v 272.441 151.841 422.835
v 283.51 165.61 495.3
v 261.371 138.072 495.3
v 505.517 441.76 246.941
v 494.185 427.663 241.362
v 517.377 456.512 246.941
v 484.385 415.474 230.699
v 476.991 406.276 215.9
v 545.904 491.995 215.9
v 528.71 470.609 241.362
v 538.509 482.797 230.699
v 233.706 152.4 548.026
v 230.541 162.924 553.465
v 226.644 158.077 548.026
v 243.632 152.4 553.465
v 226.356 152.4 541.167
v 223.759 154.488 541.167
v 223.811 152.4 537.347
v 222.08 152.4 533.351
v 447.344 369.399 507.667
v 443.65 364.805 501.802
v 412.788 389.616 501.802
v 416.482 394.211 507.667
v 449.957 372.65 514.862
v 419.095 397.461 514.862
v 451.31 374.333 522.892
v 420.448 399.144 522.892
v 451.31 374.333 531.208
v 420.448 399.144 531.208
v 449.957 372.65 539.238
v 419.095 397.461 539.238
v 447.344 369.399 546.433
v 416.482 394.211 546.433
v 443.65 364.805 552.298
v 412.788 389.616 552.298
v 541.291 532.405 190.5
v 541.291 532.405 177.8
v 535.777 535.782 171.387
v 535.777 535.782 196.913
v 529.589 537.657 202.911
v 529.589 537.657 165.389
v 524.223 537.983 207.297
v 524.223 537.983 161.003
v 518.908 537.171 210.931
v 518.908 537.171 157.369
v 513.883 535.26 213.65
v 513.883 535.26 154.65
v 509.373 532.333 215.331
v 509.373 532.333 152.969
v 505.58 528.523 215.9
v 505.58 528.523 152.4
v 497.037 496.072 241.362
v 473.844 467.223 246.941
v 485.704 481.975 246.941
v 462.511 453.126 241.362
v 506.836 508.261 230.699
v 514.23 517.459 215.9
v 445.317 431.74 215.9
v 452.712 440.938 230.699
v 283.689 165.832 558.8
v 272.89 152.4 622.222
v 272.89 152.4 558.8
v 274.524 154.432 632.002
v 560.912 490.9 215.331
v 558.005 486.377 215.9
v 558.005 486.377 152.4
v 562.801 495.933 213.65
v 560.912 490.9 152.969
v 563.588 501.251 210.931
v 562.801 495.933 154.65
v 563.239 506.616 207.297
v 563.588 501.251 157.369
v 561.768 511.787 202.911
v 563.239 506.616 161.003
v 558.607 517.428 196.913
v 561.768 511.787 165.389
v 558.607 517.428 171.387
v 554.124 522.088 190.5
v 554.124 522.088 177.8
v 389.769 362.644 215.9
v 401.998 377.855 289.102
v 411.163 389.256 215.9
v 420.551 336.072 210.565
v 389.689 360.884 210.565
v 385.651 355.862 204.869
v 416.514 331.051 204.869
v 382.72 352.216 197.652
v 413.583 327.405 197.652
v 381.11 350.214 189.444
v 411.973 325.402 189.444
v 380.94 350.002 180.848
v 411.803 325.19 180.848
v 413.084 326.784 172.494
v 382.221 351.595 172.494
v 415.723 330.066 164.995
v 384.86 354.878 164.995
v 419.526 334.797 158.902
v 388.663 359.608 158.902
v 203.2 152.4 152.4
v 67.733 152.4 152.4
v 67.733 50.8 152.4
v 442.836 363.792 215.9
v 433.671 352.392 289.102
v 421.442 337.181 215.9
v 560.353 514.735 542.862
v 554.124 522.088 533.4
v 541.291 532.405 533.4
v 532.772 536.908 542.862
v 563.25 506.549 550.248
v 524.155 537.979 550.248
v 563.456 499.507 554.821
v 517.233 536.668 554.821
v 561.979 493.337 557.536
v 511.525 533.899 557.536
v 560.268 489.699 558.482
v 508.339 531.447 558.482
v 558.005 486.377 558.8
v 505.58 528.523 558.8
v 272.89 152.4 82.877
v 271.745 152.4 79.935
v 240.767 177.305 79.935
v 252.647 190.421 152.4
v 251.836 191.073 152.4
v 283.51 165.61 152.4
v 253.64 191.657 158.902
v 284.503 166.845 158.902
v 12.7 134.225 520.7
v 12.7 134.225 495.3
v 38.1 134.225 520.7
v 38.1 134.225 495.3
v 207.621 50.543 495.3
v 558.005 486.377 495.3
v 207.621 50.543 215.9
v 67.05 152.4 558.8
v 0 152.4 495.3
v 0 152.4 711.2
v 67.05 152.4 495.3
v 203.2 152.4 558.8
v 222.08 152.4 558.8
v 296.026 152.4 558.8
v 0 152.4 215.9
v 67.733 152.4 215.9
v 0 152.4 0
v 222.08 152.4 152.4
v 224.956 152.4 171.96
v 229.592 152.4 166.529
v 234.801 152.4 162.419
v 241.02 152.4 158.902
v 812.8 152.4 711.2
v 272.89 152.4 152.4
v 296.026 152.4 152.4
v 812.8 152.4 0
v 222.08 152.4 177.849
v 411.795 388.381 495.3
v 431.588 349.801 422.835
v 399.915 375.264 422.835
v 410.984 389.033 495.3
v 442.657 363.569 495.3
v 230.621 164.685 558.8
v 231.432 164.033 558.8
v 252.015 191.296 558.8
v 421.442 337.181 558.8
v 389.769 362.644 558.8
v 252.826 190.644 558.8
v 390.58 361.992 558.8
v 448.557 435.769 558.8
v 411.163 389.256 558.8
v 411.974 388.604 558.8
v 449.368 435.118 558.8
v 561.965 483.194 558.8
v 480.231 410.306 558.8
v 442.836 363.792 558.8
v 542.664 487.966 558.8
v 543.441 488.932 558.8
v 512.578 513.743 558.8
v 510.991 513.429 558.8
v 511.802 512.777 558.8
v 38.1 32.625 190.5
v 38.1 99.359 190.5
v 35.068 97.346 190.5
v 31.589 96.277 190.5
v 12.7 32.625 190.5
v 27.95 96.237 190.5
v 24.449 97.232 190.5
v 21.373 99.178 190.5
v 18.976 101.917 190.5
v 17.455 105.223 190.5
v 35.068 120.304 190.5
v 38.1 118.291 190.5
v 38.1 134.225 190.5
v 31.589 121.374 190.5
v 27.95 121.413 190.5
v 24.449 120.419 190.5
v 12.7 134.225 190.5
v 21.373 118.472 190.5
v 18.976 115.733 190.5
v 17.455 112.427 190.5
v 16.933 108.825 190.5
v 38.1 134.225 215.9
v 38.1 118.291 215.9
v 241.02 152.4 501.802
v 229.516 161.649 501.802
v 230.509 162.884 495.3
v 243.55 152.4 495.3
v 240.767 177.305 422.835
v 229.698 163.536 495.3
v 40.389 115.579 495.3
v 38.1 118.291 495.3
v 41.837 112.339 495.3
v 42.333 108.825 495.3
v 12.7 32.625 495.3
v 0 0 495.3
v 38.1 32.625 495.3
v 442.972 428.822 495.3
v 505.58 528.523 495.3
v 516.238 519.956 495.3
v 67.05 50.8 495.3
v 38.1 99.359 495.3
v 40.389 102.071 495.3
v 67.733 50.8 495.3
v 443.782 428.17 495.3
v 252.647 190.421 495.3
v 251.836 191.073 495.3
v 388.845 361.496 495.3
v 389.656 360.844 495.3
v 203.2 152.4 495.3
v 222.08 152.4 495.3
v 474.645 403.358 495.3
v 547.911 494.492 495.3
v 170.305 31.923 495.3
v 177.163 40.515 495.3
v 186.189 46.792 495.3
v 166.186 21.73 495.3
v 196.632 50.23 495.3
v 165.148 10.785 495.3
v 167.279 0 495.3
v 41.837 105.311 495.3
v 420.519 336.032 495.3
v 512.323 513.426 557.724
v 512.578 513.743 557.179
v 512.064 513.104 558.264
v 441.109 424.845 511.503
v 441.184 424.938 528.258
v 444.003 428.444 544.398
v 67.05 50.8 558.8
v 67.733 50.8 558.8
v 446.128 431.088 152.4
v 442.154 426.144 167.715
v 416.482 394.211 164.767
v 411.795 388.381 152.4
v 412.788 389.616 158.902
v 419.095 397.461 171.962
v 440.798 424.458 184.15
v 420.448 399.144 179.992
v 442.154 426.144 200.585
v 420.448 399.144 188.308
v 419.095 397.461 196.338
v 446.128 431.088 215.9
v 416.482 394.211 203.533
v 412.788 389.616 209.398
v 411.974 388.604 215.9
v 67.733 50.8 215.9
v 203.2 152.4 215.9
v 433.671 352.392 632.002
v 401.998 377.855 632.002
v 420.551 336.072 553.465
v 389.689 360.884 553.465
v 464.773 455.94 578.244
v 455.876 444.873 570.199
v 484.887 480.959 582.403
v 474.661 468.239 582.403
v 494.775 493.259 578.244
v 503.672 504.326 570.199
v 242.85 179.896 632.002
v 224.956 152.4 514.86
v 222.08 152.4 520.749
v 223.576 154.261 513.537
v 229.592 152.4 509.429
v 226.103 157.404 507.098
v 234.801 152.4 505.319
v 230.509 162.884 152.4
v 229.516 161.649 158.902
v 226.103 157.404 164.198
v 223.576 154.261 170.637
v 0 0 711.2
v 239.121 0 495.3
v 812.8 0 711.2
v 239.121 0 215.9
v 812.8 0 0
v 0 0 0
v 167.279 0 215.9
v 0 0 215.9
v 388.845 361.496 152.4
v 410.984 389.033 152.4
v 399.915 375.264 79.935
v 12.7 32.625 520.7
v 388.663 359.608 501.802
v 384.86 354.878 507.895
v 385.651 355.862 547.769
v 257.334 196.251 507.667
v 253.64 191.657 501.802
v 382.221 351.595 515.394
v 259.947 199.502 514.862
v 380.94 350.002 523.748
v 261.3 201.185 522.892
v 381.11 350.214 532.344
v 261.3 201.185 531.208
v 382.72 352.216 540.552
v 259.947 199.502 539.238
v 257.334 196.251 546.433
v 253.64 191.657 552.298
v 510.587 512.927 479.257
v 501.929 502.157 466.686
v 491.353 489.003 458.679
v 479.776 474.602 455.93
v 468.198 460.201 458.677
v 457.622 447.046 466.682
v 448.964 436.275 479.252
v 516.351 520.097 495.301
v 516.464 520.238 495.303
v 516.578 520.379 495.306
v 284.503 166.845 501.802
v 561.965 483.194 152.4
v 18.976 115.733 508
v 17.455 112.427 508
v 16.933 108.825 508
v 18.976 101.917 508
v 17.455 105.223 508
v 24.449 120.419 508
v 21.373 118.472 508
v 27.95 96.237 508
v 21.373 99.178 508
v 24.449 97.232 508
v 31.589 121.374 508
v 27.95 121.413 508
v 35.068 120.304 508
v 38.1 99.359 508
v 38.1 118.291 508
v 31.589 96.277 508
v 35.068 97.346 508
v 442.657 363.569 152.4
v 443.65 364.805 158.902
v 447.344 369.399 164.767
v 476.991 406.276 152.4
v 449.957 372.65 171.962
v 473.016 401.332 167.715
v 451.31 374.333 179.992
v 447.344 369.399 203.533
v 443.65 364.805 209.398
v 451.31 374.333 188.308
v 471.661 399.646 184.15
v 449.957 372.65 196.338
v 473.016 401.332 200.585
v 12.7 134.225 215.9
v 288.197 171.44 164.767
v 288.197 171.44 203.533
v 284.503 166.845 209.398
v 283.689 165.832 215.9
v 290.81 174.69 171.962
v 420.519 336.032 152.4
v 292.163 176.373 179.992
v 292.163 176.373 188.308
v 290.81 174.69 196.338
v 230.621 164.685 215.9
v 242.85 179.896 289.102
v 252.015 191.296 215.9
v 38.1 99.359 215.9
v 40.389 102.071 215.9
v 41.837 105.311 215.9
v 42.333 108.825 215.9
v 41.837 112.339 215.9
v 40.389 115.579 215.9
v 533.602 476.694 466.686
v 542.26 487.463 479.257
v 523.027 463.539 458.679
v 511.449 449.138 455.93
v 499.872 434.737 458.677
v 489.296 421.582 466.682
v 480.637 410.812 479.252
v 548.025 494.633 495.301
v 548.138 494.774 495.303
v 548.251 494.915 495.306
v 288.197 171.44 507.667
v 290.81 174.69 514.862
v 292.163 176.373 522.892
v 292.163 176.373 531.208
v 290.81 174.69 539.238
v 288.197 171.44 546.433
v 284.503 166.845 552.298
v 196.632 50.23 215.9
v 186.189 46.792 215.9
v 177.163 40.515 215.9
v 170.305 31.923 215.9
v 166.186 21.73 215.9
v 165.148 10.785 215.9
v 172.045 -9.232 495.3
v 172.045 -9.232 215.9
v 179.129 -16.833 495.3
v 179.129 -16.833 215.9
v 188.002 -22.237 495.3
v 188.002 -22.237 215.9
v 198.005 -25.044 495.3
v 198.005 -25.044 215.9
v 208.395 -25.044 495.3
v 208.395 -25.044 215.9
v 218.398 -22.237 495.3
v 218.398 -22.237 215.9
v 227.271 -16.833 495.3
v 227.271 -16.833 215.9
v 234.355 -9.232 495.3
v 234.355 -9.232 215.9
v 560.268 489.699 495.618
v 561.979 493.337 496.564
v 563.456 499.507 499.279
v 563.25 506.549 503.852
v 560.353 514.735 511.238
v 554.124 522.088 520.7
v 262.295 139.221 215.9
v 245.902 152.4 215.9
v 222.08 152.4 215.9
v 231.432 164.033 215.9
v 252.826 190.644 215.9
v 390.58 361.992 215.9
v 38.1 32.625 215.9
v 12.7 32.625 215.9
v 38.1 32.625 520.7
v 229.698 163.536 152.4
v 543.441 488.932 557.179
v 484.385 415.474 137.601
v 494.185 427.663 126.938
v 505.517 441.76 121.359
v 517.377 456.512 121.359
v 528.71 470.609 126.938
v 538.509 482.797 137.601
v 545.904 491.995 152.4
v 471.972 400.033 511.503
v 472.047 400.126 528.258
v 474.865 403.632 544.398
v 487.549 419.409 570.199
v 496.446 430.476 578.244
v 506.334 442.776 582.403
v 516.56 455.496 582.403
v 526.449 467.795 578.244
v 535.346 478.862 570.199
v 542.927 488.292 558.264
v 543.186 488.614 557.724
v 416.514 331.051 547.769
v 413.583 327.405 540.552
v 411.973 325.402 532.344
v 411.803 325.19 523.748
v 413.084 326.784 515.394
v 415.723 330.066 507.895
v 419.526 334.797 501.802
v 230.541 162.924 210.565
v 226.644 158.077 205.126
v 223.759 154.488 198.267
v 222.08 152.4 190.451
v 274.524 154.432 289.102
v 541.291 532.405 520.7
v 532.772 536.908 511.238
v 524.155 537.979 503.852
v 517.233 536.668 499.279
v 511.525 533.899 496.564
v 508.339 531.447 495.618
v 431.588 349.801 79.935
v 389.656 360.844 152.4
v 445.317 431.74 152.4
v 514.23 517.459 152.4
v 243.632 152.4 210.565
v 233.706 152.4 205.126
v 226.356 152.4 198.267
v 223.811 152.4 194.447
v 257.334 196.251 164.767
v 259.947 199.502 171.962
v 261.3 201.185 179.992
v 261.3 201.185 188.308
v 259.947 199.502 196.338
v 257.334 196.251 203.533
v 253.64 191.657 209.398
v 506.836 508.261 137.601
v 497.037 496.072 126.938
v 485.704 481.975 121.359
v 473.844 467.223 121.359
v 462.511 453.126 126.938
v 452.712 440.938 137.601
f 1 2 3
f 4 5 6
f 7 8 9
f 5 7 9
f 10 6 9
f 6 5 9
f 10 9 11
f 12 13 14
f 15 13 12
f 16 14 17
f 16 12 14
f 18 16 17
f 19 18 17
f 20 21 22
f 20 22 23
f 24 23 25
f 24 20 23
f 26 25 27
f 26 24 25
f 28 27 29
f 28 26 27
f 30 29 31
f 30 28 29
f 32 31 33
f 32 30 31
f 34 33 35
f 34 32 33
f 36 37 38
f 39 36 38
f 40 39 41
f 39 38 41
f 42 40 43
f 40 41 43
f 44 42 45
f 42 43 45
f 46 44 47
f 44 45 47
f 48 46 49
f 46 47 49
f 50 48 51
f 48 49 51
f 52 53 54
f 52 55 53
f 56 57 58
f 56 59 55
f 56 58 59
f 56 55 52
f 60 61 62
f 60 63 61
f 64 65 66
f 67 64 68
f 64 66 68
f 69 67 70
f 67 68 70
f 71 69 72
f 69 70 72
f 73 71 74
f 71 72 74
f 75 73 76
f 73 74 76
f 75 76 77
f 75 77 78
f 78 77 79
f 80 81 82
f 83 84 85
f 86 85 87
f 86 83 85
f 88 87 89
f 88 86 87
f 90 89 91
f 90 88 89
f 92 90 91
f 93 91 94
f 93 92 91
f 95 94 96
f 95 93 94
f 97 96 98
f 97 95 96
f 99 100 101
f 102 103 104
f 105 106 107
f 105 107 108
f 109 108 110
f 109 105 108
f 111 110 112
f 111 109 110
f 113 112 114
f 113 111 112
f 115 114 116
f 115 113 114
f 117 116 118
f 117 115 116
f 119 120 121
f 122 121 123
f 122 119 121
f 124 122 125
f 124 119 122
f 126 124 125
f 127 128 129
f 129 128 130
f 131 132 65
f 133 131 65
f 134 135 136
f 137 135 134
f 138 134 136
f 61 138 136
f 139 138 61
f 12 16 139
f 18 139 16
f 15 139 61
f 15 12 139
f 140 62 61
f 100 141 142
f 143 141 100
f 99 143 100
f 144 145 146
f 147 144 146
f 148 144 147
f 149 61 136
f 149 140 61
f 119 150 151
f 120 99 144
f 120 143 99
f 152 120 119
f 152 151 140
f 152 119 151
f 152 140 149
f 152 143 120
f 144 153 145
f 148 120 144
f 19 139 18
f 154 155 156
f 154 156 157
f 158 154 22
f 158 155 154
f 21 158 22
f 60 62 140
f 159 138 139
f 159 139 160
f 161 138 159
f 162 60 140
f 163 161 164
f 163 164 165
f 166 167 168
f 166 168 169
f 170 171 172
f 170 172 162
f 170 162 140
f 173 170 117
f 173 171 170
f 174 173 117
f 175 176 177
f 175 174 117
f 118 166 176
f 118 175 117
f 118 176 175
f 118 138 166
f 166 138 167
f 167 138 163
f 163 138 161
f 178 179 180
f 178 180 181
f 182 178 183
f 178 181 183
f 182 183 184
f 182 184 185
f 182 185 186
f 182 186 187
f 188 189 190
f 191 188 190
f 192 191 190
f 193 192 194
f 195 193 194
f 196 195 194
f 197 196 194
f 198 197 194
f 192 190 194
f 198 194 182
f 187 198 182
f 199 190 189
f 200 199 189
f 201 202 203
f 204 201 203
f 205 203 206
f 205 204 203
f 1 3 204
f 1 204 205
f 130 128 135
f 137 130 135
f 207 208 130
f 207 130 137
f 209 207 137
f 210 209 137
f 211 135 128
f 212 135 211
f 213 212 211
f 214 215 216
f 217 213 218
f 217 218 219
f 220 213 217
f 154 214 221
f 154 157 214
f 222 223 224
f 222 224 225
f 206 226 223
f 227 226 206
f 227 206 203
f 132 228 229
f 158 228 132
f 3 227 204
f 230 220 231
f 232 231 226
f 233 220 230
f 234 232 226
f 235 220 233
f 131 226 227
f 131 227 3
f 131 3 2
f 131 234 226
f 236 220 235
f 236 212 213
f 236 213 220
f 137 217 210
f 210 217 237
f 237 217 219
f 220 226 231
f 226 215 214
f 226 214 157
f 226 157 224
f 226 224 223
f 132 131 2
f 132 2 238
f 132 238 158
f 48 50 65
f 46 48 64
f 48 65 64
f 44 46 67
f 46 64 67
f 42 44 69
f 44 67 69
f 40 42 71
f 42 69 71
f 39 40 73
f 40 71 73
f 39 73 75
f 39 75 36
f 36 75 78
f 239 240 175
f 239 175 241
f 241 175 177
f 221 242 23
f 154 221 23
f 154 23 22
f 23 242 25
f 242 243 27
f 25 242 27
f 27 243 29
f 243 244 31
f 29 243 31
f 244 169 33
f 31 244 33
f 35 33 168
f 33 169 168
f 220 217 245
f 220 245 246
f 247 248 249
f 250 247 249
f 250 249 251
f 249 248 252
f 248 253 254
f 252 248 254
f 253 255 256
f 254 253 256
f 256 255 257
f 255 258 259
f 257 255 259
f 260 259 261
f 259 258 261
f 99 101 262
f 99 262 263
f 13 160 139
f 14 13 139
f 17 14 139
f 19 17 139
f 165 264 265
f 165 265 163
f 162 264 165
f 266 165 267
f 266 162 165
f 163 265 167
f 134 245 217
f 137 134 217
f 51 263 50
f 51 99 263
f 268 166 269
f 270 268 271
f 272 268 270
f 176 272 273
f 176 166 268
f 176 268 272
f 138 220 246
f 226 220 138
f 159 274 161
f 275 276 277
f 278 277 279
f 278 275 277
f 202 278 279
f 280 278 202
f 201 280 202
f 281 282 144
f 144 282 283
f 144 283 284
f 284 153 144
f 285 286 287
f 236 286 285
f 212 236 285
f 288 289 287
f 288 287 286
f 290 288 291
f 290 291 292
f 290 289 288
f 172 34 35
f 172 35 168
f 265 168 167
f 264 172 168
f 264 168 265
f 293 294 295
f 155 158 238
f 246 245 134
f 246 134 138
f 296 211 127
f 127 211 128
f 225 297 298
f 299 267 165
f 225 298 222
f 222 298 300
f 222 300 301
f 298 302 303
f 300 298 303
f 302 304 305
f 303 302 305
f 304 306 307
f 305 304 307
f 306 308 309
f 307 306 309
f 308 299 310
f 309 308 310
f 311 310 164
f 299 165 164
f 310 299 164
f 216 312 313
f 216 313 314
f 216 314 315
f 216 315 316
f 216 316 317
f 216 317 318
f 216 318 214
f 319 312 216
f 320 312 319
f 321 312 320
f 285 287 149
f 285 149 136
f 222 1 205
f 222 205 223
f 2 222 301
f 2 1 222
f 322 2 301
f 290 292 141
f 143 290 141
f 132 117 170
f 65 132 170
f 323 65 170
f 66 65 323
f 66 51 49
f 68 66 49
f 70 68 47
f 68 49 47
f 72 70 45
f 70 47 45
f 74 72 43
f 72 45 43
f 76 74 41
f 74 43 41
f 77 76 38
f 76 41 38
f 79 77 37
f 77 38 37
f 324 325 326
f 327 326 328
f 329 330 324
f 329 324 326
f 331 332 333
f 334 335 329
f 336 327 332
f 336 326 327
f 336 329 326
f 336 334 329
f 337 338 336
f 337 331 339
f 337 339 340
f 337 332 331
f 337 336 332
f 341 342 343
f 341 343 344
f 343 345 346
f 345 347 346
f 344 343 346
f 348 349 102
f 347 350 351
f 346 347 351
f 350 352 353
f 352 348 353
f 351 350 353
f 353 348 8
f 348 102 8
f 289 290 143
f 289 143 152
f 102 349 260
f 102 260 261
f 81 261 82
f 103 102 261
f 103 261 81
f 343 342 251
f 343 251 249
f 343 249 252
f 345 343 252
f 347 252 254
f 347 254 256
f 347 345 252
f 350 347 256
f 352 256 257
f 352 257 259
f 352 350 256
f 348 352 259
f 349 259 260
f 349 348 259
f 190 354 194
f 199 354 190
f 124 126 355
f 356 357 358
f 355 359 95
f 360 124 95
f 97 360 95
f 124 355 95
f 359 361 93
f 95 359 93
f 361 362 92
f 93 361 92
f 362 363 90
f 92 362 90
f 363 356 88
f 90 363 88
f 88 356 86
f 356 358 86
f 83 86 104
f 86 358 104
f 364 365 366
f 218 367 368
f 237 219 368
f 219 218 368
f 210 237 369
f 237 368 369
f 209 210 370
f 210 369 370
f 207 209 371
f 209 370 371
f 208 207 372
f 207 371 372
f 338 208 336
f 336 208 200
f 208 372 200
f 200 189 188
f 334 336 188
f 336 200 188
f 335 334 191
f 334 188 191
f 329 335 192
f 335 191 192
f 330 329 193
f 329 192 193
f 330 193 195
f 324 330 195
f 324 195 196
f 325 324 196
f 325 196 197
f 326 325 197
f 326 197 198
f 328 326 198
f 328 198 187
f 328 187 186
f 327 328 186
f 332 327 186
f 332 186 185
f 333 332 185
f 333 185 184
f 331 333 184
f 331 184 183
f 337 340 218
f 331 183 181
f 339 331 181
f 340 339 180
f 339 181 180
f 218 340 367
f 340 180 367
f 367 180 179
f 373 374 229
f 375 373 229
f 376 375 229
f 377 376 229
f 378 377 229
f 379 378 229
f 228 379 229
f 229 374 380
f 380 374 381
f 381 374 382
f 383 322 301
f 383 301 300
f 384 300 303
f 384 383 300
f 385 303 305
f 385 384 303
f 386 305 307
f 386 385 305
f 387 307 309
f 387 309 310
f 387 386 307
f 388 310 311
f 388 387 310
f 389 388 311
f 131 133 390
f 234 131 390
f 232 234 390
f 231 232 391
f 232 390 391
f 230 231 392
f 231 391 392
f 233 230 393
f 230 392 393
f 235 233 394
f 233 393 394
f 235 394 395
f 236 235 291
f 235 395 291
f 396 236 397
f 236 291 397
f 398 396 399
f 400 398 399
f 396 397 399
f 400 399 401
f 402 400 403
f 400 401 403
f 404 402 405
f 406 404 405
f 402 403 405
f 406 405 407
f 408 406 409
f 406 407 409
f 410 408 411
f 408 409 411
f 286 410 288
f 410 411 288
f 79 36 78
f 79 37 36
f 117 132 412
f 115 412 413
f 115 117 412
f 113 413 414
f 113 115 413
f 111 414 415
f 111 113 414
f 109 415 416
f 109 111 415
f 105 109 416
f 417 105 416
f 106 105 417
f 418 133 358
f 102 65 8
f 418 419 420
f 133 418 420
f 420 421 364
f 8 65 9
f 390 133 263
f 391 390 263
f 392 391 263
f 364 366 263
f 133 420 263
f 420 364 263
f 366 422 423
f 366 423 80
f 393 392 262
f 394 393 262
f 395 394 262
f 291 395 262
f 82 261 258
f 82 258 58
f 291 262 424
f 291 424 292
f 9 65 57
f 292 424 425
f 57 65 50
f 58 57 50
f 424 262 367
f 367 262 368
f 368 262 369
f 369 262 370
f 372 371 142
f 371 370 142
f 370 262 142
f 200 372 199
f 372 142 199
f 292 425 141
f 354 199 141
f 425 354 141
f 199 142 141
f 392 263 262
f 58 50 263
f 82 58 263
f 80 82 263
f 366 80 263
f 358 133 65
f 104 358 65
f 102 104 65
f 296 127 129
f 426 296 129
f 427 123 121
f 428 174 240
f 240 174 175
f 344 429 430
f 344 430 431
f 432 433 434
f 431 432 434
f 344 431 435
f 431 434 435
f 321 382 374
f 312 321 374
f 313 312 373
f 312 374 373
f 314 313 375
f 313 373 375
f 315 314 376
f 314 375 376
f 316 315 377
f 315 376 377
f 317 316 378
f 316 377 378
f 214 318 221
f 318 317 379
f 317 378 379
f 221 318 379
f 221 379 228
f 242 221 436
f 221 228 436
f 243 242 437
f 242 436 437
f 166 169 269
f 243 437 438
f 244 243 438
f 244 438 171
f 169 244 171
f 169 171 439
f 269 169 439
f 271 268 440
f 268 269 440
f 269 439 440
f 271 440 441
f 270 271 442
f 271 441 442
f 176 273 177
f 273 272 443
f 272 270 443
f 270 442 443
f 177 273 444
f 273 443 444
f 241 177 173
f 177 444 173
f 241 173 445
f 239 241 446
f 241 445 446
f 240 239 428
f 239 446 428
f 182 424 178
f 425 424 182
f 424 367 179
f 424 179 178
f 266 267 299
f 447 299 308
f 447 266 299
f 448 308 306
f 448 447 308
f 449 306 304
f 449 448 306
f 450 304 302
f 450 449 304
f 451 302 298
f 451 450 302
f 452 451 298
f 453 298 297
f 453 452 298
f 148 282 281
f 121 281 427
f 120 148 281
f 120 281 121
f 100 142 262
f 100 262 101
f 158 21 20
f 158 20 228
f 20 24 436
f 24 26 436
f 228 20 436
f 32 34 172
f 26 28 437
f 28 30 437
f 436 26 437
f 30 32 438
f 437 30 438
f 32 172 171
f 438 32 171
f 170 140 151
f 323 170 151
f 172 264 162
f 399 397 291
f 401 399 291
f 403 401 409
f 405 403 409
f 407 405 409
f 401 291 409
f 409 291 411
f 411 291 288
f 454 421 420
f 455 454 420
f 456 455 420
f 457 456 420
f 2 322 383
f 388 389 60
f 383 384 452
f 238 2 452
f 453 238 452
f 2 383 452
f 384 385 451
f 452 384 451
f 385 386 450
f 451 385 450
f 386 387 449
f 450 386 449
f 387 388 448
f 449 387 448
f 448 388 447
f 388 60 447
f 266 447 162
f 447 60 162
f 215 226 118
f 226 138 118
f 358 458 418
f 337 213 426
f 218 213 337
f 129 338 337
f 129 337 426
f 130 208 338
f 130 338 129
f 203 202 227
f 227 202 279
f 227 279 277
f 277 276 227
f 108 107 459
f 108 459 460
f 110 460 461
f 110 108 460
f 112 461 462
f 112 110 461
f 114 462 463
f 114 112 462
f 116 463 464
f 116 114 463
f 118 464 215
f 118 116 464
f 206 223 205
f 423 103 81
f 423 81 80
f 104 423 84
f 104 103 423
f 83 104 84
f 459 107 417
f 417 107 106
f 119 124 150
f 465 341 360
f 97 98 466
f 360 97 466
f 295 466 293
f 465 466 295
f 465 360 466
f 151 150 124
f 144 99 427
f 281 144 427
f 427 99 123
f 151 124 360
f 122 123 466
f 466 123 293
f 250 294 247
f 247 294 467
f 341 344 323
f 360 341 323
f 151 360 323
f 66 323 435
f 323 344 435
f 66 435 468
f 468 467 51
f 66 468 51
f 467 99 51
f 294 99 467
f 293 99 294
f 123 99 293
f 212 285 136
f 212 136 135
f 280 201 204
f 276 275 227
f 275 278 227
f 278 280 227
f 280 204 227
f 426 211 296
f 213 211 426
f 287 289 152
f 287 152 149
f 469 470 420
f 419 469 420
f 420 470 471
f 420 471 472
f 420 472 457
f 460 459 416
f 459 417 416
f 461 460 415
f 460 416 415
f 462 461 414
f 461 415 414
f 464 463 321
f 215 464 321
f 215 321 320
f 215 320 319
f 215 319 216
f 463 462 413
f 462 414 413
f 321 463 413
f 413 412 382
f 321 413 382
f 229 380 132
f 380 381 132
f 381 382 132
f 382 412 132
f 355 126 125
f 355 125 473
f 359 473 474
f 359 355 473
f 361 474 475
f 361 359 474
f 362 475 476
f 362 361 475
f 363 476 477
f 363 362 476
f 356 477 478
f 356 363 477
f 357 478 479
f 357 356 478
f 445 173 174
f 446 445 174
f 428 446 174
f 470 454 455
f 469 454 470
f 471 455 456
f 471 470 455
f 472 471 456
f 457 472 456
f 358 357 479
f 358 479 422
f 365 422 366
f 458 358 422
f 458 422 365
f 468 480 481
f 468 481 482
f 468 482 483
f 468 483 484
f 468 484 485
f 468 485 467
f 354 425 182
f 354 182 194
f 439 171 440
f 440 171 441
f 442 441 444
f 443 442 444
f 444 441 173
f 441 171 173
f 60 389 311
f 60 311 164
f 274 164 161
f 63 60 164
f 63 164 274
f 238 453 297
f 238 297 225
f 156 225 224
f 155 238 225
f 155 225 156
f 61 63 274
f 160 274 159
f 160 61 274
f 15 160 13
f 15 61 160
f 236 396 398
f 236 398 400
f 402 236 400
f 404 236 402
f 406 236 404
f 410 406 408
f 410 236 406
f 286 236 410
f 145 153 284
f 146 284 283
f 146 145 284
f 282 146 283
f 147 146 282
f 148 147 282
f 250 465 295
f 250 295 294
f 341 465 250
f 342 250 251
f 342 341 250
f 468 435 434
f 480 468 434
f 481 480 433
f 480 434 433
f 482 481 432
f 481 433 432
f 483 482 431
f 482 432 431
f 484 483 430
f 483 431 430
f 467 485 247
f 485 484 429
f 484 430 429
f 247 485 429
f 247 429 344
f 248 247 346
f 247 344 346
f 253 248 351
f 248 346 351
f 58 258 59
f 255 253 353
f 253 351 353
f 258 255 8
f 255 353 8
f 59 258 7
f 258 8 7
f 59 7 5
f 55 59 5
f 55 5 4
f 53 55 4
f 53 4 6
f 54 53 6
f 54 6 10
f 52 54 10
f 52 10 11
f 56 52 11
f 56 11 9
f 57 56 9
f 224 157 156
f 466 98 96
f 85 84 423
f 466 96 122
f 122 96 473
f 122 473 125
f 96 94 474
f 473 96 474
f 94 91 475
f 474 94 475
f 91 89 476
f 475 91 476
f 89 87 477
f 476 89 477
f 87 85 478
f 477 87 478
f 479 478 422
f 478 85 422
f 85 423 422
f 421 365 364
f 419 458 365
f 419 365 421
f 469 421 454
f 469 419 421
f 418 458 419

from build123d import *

# Parameters (mm, degrees)
BOSS_EXTRUDE1_DEPTH  = 152.4
CUT_EXTRUDE1_DEPTH   = 406.4
BOSS_EXTRUDE2_DEPTH  = 406.4
CUT_EXTRUDE3_DEPTH   = 508
BOSS_EXTRUDE3_DEPTH  = 25.4
BOSS_EXTRUDE4_DEPTH  = 25.4
BOSS_EXTRUDE5_DEPTH  = 12.7
BOSS_EXTRUDE6_DEPTH  = 12.7
CUT_EXTRUDE4_START   = -406.4
CUT_EXTRUDE4_DEPTH   = 406.4
FILLET1_R            = 25.4
SKETCH16_W           = 406.4
SKETCH16_H           = 431.79999999999995
BOSS_EXTRUDE8_DEPTH  = 5.08
CUT_EXTRUDE5_DEPTH   = 508
SKETCH20_W           = 25.39999999999924
SKETCH20_H           = 279.40000000000003
CUT_EXTRUDE6_DEPTH   = 508
BOSS_EXTRUDE9_DEPTH  = 40.64
SKETCH22_R           = 63.50000000000003
SKETCH22_R_2         = 63.49999999999997
BOSS_EXTRUDE10_DEPTH = 40.64
SKETCH23_R           = 38.1
CUT_EXTRUDE7_DEPTH   = 279.4
SKETCH24_W           = 279.4
SKETCH24_H           = 50.542616051246114
CUT_EXTRUDE8_DEPTH   = 182.88000000000048
SKETCH25_R           = 38.1
BOSS_EXTRUDE11_DEPTH = 279.4
BOSS_EXTRUDE12_DEPTH = 63.50000000000077
BOSS_EXTRUDE14_DEPTH = 63.50000000000077
SKETCH32_W           = 67.04968691962685
SKETCH32_H           = 63.49999999999994
SKETCH32_W_2         = 67.73333333333292
SKETCH32_H_2         = 63.49999999999997
BOSS_EXTRUDE15_DEPTH = 101.6
CUT_EXTRUDE9_DEPTH   = 25.4
SKETCH34_W           = 25.40000000000001
SKETCH34_H           = 101.6
CUT_EXTRUDE11_DEPTH  = 304.8
SKETCH36_R           = 12.7
BOSS_EXTRUDE16_DEPTH = 317.5


with BuildPart() as part:
    # Sketch1 → Boss-Extrude1 (new body)
    with BuildSketch(Plane(origin=(0, 0, 0), x_dir=(1, 0, 0), z_dir=(0, 1, 0))):
        Polygon((0, 0), (812.8, 0), (812.8000000000001, -711.1999999999999), (0, -711.1999999999999), align=None)
    extrude(amount=BOSS_EXTRUDE1_DEPTH)

    # Sketch2 → Cut-Extrude1 (cut)
    with BuildSketch(Plane(origin=(0, 0, 152.4), x_dir=(-1, 0, 0), z_dir=(0, 0, -1))):
        Polygon((0, 0), (-203.2, 152.4), (0, 152.4), align=None)
    extrude(amount=-CUT_EXTRUDE1_DEPTH, mode=Mode.SUBTRACT)

    # Sketch5 → Boss-Extrude2 (add)
    with BuildSketch(Plane.XY.offset(558.8)):
        Polygon((203.2, 152.4), (521.495119519974, 548.3194575791465), (554.1241709988542, 522.0876883607381), (256.91779556245336, 152.39999999999998), align=None)
    extrude(amount=-BOSS_EXTRUDE2_DEPTH)

    # Sketch6 → Cut-Extrude3 (cut)
    with BuildSketch(Plane(origin=(472.48898283734724, 587.7174054041558, 0), x_dir=(0.7793690109825708, -0.6265651959054618, 0), z_dir=(0.6265651959054618, 0.7793690109825708, 0))):
        Polygon((62.87924717566551, -203.2), (104.74523237533951, -203.2), (104.74523237533951, -508), (62.87924717566555, -508), align=None)
    extrude(amount=-CUT_EXTRUDE3_DEPTH, mode=Mode.SUBTRACT)

    # Sketch8 → Boss-Extrude3 (add)
    with BuildSketch(Plane(origin=(81.63518816150813, -65.62971704341768, 0), x_dir=(0, 0, -1), z_dir=(0.7793690109825717, -0.6265651959054606, 0))):
        Polygon((-558.8, 754.0938850817336), (-508, 754.0938850817336), (-508, 246.0938850817336), (-558.7999999999998, 246.0938850817336), align=None)
    extrude(amount=BOSS_EXTRUDE3_DEPTH)

    # Sketch9 → Boss-Extrude4 (add)
    with BuildSketch(Plane(origin=(81.63518816150813, -65.62971704341768, 0), x_dir=(0, 0, -1), z_dir=(0.7793690109825717, -0.6265651959054606, 0))):
        Polygon((-203.2, 754.0938850817341), (-152.39999999999998, 754.0938850817341), (-152.39999999999998, 246.09388508173413), (-203.19999999999993, 246.09388508173413), align=None)
    extrude(amount=BOSS_EXTRUDE4_DEPTH)

    # Sketch10 → Boss-Extrude5 (add)
    with BuildSketch(Plane.XY.offset(203.2)):
        Polygon((203.1999999999997, 152.40000000000092), (521.4951195199743, 548.319457579147), (573.920143877812, 506.1729323847398), (289.50826251979043, 152.39999999999992), (256.9177955624533, 152.39999999999986), (235.82905147888056, 126.16823078159206), align=None)
    extrude(amount=BOSS_EXTRUDE5_DEPTH)

    # Sketch11 → Boss-Extrude6 (add)
    with BuildSketch(Plane(origin=(0, 0, 508), x_dir=(-1, 0, 0), z_dir=(0, 0, -1))):
        Polygon((-573.9201438778116, 506.1729323847395), (-289.5082625197906, 152.40000000000015), (-256.91779556245325, 152.39999999999995), (-235.82905147888056, 126.16823078159206), (-203.1999999999997, 152.40000000000092), (-521.4951195199743, 548.319457579147), align=None)
    extrude(amount=BOSS_EXTRUDE6_DEPTH)

    # Sketch12 → Cut-Extrude4 (cut)
    with BuildSketch(Plane(origin=(0, 0, 152.39999999999975), x_dir=(-1, 0, 0), z_dir=(0, 0, -1)).offset(CUT_EXTRUDE4_START)):
        Polygon((-272.8899527583018, 152.4), (-543.4408043502763, 488.93153894227703), (-512.5781156253607, 513.7432601354462), (-222.08015203498906, 152.39999999999998), align=None)
    extrude(amount=CUT_EXTRUDE4_DEPTH, mode=Mode.SUBTRACT)

    # Fillet1
    fillet1_edges = [part.edges().sort_by_distance(p)[0] for p in [
        (547.7076316988932, 527.2461949819434, 215.89999999999998),
        (547.707631698893, 527.2461949819433, 495.3),
        (547.707631698893, 527.2461949819432, 152.39999999999998),
        (521.4951195199742, 548.3194575791467, 184.14999999999998),
        (547.7076316988928, 527.246194981943, 558.8),
        (521.4951195199742, 548.3194575791467, 527.05),
        (573.9201438778116, 506.17293238473945, 527.05),
        (573.920143877812, 506.17293238473985, 184.14999999999998),
    ]]
    fillet(fillet1_edges, radius=FILLET1_R)

    # Sketch16 → Boss-Extrude8 (add)
    with BuildSketch(Plane(origin=(101.43116104046555, -81.54447301941644, 0), x_dir=(0, 0, -1), z_dir=(0.7793690109825715, -0.6265651959054606, 0))):
        with Locations((-355.59999999999997, 512.7938850817336)):
            Rectangle(SKETCH16_W, SKETCH16_H)
    extrude(amount=BOSS_EXTRUDE8_DEPTH)

    # Sketch18 → Cut-Extrude5 (cut)
    with BuildSketch(Plane(origin=(154.19386331737303, 191.79794782500986, 0), x_dir=(0.7793690109825709, -0.6265651959054616, 0), z_dir=(0.6265651959054614, 0.7793690109825708, 0))):
        Polygon((62.8792471756653, -215.89999999999998), (4.163e-14, -215.89999999999998), (4.163e-14, -495.3), (62.8792471756653, -495.3), (104.74523237533926, -495.3), (130.1452323753393, -495.3), (130.14523237533894, -215.89999999999998), (104.74523237533926, -215.89999999999998), align=None)
    extrude(amount=-CUT_EXTRUDE5_DEPTH, mode=Mode.SUBTRACT)

    # Sketch20 → Cut-Extrude6 (cut)
    with BuildSketch(Plane(origin=(154.19386331737306, 191.79794782500986, 0), x_dir=(-0.7793690109825709, 0.6265651959054614, 0), z_dir=(-0.6265651959054614, -0.7793690109825709, 0))):
        with Locations((-117.44523237533932, -355.6)):
            Rectangle(SKETCH20_W, SKETCH20_H)
    extrude(amount=-CUT_EXTRUDE6_DEPTH, mode=Mode.SUBTRACT)

    # Sketch21 → Boss-Extrude9 (add)
    with BuildSketch(Plane(origin=(91.33693287972456, -73.42932864502501, 0), x_dir=(0, 0, 1), z_dir=(-0.7793690109825776, 0.6265651959054531, 0))):
        with BuildLine():
            Line((209.39759999999998, 562.2934659364746), (289.1018868532613, 546.366600042237))
            Line((289.1018868532613, 546.366600042237), (210.56545348218663, 525.4269956202154))
            ThreePointArc((210.56545348218663, 525.4269956202154), (185.1552700280405, 511.30785991563), (158.90239999999997, 523.7904170057728))
            Line((158.90239999999997, 523.7904170057728), (79.93520930816898, 543.0419414711238))
            Line((79.93520930816898, 543.0419414711238), (158.90239999999997, 562.2934659364746))
            ThreePointArc((158.90239999999997, 562.2934659364746), (184.14999999999998, 574.7919414711238), (209.39759999999998, 562.2934659364746))
        make_face()
        with BuildLine():
            Line((289.1018868532613, 292.366600042237), (210.56545348218663, 271.42699562021545))
            ThreePointArc((210.56545348218663, 271.42699562021545), (185.15527002804046, 257.30785991563005), (158.90239999999997, 269.7904170057729))
            Line((158.90239999999997, 269.7904170057729), (79.93520930816898, 289.0419414711237))
            Line((79.93520930816898, 289.0419414711237), (158.90239999999997, 308.29346593647455))
            ThreePointArc((158.90239999999997, 308.29346593647455), (184.14999999999998, 320.7919414711238), (209.39759999999998, 308.29346593647455))
            Line((209.39759999999998, 308.29346593647455), (289.1018868532613, 292.366600042237))
        make_face()
        with BuildLine():
            Line((632.0018868532613, 292.36660004223734), (553.4654534821866, 271.4269956202158))
            ThreePointArc((553.4654534821866, 271.4269956202158), (528.0552700280405, 257.3078599156303), (501.8024, 269.79041700577324))
            Line((501.8024, 269.79041700577324), (422.835209308169, 289.04194147112406))
            Line((422.835209308169, 289.04194147112406), (501.8024, 308.2934659364749))
            ThreePointArc((501.8024, 308.2934659364749), (527.0500000000001, 320.791941471124), (552.2976, 308.2934659364749))
            Line((552.2976, 308.2934659364749), (632.0018868532613, 292.36660004223734))
        make_face()
        with BuildLine():
            Line((501.8024, 523.7904170057732), (422.835209308169, 543.041941471124))
            Line((422.835209308169, 543.041941471124), (501.8024, 562.293465936475))
            ThreePointArc((501.8024, 562.293465936475), (527.0500000000001, 574.791941471124), (552.2976, 562.293465936475))
            Line((552.2976, 562.293465936475), (632.0018868532613, 546.3666000422373))
            Line((632.0018868532613, 546.3666000422373), (553.4654534821866, 525.4269956202157))
            ThreePointArc((553.4654534821866, 525.4269956202157), (528.0552700280405, 511.3078599156302), (501.8024, 523.7904170057732))
        make_face()
    extrude(amount=BOSS_EXTRUDE9_DEPTH)

    # Sketch22 → Boss-Extrude10 (add)
    with BuildSketch(Plane(origin=(91.33693287972456, -73.42932864502501, 0), x_dir=(0, 0, 1), z_dir=(-0.7793690109825776, 0.6265651959054531, 0))):
        with Locations((184.14999999999998, 670.4976110611291)):
            Circle(SKETCH22_R)
        with Locations((519.43, 670.4976110611292)):
            Circle(SKETCH22_R_2)
    extrude(amount=BOSS_EXTRUDE10_DEPTH)

    # Sketch23 → Cut-Extrude7 (cut)
    with BuildSketch(Plane.XY.offset(215.89999999999998)):
        with Locations((203.2, 12.700000000001378)):
            Circle(SKETCH23_R)
    extrude(amount=CUT_EXTRUDE7_DEPTH, mode=Mode.SUBTRACT)

    # Sketch24 → Cut-Extrude8 (cut)
    with BuildSketch(Plane.ZY):
        with Locations((355.59999999999997, 25.271308025623057)):
            Rectangle(SKETCH24_W, SKETCH24_H)
    extrude(amount=-CUT_EXTRUDE8_DEPTH, mode=Mode.SUBTRACT)

    # Sketch25 → Boss-Extrude11 (add)
    with BuildSketch(Plane.XY.offset(215.89999999999998)):
        with Locations((203.2, 12.700000000001378)):
            Circle(SKETCH25_R)
    extrude(amount=BOSS_EXTRUDE11_DEPTH)

    # Sketch26 → Boss-Extrude12 (add)
    with BuildSketch(Plane.XY.offset(215.89999999999998)):
        Polygon((0, 0), (-6.22e-15, 50.8), (67.73333333333265, 50.8), align=None)
    extrude(amount=-BOSS_EXTRUDE12_DEPTH)

    # Sketch30 → Boss-Extrude14 (add)
    with BuildSketch(Plane(origin=(0, 0, 495.3), x_dir=(-1, 0, 0), z_dir=(0, 0, -1))):
        Polygon((2.776e-14, -2.776e-14), (0, 50.79999999999997), (-67.73333333333278, 50.79999999999996), align=None)
    extrude(amount=-BOSS_EXTRUDE14_DEPTH)

    # Sketch32 → Boss-Extrude15 (add)
    with BuildSketch(Plane(origin=(5.2e-15, 50.79999999999997, 0), x_dir=(1, -1e-16, 0), z_dir=(1e-16, 1, 0))):
        with Locations((33.524843459813425, -527.05)):
            Rectangle(SKETCH32_W, SKETCH32_H)
        with Locations((33.86666666666645, -184.14999999999998)):
            Rectangle(SKETCH32_W_2, SKETCH32_H_2)
    extrude(amount=BOSS_EXTRUDE15_DEPTH)

    # Sketch33 → Cut-Extrude9 (cut)
    with BuildSketch(Plane.XY.offset(215.89999999999998)):
        Polygon((12.69999999999997, 134.2251095976107), (38.099999999999966, 134.2251095976107), (38.09999999999998, 32.625109597610695), (12.699999999999983, 32.625109597610695), align=None)
    extrude(amount=-CUT_EXTRUDE9_DEPTH, mode=Mode.SUBTRACT)

    # Sketch34 → Cut-Extrude11 (cut)
    with BuildSketch(Plane.XY.offset(215.89999999999998)):
        with Locations((25.399999999999977, 83.4251095976107)):
            Rectangle(SKETCH34_W, SKETCH34_H)
    extrude(amount=CUT_EXTRUDE11_DEPTH, mode=Mode.SUBTRACT)

    # Sketch36 → Boss-Extrude16 (add)
    with BuildSketch(Plane.XY.offset(190.49999999999997)):
        with Locations(Location((29.63333333333292, 108.82510959761069, 0), (0, 0, 311.810314896))):
            Circle(SKETCH36_R)
    extrude(amount=BOSS_EXTRUDE16_DEPTH)


solid = part.part
